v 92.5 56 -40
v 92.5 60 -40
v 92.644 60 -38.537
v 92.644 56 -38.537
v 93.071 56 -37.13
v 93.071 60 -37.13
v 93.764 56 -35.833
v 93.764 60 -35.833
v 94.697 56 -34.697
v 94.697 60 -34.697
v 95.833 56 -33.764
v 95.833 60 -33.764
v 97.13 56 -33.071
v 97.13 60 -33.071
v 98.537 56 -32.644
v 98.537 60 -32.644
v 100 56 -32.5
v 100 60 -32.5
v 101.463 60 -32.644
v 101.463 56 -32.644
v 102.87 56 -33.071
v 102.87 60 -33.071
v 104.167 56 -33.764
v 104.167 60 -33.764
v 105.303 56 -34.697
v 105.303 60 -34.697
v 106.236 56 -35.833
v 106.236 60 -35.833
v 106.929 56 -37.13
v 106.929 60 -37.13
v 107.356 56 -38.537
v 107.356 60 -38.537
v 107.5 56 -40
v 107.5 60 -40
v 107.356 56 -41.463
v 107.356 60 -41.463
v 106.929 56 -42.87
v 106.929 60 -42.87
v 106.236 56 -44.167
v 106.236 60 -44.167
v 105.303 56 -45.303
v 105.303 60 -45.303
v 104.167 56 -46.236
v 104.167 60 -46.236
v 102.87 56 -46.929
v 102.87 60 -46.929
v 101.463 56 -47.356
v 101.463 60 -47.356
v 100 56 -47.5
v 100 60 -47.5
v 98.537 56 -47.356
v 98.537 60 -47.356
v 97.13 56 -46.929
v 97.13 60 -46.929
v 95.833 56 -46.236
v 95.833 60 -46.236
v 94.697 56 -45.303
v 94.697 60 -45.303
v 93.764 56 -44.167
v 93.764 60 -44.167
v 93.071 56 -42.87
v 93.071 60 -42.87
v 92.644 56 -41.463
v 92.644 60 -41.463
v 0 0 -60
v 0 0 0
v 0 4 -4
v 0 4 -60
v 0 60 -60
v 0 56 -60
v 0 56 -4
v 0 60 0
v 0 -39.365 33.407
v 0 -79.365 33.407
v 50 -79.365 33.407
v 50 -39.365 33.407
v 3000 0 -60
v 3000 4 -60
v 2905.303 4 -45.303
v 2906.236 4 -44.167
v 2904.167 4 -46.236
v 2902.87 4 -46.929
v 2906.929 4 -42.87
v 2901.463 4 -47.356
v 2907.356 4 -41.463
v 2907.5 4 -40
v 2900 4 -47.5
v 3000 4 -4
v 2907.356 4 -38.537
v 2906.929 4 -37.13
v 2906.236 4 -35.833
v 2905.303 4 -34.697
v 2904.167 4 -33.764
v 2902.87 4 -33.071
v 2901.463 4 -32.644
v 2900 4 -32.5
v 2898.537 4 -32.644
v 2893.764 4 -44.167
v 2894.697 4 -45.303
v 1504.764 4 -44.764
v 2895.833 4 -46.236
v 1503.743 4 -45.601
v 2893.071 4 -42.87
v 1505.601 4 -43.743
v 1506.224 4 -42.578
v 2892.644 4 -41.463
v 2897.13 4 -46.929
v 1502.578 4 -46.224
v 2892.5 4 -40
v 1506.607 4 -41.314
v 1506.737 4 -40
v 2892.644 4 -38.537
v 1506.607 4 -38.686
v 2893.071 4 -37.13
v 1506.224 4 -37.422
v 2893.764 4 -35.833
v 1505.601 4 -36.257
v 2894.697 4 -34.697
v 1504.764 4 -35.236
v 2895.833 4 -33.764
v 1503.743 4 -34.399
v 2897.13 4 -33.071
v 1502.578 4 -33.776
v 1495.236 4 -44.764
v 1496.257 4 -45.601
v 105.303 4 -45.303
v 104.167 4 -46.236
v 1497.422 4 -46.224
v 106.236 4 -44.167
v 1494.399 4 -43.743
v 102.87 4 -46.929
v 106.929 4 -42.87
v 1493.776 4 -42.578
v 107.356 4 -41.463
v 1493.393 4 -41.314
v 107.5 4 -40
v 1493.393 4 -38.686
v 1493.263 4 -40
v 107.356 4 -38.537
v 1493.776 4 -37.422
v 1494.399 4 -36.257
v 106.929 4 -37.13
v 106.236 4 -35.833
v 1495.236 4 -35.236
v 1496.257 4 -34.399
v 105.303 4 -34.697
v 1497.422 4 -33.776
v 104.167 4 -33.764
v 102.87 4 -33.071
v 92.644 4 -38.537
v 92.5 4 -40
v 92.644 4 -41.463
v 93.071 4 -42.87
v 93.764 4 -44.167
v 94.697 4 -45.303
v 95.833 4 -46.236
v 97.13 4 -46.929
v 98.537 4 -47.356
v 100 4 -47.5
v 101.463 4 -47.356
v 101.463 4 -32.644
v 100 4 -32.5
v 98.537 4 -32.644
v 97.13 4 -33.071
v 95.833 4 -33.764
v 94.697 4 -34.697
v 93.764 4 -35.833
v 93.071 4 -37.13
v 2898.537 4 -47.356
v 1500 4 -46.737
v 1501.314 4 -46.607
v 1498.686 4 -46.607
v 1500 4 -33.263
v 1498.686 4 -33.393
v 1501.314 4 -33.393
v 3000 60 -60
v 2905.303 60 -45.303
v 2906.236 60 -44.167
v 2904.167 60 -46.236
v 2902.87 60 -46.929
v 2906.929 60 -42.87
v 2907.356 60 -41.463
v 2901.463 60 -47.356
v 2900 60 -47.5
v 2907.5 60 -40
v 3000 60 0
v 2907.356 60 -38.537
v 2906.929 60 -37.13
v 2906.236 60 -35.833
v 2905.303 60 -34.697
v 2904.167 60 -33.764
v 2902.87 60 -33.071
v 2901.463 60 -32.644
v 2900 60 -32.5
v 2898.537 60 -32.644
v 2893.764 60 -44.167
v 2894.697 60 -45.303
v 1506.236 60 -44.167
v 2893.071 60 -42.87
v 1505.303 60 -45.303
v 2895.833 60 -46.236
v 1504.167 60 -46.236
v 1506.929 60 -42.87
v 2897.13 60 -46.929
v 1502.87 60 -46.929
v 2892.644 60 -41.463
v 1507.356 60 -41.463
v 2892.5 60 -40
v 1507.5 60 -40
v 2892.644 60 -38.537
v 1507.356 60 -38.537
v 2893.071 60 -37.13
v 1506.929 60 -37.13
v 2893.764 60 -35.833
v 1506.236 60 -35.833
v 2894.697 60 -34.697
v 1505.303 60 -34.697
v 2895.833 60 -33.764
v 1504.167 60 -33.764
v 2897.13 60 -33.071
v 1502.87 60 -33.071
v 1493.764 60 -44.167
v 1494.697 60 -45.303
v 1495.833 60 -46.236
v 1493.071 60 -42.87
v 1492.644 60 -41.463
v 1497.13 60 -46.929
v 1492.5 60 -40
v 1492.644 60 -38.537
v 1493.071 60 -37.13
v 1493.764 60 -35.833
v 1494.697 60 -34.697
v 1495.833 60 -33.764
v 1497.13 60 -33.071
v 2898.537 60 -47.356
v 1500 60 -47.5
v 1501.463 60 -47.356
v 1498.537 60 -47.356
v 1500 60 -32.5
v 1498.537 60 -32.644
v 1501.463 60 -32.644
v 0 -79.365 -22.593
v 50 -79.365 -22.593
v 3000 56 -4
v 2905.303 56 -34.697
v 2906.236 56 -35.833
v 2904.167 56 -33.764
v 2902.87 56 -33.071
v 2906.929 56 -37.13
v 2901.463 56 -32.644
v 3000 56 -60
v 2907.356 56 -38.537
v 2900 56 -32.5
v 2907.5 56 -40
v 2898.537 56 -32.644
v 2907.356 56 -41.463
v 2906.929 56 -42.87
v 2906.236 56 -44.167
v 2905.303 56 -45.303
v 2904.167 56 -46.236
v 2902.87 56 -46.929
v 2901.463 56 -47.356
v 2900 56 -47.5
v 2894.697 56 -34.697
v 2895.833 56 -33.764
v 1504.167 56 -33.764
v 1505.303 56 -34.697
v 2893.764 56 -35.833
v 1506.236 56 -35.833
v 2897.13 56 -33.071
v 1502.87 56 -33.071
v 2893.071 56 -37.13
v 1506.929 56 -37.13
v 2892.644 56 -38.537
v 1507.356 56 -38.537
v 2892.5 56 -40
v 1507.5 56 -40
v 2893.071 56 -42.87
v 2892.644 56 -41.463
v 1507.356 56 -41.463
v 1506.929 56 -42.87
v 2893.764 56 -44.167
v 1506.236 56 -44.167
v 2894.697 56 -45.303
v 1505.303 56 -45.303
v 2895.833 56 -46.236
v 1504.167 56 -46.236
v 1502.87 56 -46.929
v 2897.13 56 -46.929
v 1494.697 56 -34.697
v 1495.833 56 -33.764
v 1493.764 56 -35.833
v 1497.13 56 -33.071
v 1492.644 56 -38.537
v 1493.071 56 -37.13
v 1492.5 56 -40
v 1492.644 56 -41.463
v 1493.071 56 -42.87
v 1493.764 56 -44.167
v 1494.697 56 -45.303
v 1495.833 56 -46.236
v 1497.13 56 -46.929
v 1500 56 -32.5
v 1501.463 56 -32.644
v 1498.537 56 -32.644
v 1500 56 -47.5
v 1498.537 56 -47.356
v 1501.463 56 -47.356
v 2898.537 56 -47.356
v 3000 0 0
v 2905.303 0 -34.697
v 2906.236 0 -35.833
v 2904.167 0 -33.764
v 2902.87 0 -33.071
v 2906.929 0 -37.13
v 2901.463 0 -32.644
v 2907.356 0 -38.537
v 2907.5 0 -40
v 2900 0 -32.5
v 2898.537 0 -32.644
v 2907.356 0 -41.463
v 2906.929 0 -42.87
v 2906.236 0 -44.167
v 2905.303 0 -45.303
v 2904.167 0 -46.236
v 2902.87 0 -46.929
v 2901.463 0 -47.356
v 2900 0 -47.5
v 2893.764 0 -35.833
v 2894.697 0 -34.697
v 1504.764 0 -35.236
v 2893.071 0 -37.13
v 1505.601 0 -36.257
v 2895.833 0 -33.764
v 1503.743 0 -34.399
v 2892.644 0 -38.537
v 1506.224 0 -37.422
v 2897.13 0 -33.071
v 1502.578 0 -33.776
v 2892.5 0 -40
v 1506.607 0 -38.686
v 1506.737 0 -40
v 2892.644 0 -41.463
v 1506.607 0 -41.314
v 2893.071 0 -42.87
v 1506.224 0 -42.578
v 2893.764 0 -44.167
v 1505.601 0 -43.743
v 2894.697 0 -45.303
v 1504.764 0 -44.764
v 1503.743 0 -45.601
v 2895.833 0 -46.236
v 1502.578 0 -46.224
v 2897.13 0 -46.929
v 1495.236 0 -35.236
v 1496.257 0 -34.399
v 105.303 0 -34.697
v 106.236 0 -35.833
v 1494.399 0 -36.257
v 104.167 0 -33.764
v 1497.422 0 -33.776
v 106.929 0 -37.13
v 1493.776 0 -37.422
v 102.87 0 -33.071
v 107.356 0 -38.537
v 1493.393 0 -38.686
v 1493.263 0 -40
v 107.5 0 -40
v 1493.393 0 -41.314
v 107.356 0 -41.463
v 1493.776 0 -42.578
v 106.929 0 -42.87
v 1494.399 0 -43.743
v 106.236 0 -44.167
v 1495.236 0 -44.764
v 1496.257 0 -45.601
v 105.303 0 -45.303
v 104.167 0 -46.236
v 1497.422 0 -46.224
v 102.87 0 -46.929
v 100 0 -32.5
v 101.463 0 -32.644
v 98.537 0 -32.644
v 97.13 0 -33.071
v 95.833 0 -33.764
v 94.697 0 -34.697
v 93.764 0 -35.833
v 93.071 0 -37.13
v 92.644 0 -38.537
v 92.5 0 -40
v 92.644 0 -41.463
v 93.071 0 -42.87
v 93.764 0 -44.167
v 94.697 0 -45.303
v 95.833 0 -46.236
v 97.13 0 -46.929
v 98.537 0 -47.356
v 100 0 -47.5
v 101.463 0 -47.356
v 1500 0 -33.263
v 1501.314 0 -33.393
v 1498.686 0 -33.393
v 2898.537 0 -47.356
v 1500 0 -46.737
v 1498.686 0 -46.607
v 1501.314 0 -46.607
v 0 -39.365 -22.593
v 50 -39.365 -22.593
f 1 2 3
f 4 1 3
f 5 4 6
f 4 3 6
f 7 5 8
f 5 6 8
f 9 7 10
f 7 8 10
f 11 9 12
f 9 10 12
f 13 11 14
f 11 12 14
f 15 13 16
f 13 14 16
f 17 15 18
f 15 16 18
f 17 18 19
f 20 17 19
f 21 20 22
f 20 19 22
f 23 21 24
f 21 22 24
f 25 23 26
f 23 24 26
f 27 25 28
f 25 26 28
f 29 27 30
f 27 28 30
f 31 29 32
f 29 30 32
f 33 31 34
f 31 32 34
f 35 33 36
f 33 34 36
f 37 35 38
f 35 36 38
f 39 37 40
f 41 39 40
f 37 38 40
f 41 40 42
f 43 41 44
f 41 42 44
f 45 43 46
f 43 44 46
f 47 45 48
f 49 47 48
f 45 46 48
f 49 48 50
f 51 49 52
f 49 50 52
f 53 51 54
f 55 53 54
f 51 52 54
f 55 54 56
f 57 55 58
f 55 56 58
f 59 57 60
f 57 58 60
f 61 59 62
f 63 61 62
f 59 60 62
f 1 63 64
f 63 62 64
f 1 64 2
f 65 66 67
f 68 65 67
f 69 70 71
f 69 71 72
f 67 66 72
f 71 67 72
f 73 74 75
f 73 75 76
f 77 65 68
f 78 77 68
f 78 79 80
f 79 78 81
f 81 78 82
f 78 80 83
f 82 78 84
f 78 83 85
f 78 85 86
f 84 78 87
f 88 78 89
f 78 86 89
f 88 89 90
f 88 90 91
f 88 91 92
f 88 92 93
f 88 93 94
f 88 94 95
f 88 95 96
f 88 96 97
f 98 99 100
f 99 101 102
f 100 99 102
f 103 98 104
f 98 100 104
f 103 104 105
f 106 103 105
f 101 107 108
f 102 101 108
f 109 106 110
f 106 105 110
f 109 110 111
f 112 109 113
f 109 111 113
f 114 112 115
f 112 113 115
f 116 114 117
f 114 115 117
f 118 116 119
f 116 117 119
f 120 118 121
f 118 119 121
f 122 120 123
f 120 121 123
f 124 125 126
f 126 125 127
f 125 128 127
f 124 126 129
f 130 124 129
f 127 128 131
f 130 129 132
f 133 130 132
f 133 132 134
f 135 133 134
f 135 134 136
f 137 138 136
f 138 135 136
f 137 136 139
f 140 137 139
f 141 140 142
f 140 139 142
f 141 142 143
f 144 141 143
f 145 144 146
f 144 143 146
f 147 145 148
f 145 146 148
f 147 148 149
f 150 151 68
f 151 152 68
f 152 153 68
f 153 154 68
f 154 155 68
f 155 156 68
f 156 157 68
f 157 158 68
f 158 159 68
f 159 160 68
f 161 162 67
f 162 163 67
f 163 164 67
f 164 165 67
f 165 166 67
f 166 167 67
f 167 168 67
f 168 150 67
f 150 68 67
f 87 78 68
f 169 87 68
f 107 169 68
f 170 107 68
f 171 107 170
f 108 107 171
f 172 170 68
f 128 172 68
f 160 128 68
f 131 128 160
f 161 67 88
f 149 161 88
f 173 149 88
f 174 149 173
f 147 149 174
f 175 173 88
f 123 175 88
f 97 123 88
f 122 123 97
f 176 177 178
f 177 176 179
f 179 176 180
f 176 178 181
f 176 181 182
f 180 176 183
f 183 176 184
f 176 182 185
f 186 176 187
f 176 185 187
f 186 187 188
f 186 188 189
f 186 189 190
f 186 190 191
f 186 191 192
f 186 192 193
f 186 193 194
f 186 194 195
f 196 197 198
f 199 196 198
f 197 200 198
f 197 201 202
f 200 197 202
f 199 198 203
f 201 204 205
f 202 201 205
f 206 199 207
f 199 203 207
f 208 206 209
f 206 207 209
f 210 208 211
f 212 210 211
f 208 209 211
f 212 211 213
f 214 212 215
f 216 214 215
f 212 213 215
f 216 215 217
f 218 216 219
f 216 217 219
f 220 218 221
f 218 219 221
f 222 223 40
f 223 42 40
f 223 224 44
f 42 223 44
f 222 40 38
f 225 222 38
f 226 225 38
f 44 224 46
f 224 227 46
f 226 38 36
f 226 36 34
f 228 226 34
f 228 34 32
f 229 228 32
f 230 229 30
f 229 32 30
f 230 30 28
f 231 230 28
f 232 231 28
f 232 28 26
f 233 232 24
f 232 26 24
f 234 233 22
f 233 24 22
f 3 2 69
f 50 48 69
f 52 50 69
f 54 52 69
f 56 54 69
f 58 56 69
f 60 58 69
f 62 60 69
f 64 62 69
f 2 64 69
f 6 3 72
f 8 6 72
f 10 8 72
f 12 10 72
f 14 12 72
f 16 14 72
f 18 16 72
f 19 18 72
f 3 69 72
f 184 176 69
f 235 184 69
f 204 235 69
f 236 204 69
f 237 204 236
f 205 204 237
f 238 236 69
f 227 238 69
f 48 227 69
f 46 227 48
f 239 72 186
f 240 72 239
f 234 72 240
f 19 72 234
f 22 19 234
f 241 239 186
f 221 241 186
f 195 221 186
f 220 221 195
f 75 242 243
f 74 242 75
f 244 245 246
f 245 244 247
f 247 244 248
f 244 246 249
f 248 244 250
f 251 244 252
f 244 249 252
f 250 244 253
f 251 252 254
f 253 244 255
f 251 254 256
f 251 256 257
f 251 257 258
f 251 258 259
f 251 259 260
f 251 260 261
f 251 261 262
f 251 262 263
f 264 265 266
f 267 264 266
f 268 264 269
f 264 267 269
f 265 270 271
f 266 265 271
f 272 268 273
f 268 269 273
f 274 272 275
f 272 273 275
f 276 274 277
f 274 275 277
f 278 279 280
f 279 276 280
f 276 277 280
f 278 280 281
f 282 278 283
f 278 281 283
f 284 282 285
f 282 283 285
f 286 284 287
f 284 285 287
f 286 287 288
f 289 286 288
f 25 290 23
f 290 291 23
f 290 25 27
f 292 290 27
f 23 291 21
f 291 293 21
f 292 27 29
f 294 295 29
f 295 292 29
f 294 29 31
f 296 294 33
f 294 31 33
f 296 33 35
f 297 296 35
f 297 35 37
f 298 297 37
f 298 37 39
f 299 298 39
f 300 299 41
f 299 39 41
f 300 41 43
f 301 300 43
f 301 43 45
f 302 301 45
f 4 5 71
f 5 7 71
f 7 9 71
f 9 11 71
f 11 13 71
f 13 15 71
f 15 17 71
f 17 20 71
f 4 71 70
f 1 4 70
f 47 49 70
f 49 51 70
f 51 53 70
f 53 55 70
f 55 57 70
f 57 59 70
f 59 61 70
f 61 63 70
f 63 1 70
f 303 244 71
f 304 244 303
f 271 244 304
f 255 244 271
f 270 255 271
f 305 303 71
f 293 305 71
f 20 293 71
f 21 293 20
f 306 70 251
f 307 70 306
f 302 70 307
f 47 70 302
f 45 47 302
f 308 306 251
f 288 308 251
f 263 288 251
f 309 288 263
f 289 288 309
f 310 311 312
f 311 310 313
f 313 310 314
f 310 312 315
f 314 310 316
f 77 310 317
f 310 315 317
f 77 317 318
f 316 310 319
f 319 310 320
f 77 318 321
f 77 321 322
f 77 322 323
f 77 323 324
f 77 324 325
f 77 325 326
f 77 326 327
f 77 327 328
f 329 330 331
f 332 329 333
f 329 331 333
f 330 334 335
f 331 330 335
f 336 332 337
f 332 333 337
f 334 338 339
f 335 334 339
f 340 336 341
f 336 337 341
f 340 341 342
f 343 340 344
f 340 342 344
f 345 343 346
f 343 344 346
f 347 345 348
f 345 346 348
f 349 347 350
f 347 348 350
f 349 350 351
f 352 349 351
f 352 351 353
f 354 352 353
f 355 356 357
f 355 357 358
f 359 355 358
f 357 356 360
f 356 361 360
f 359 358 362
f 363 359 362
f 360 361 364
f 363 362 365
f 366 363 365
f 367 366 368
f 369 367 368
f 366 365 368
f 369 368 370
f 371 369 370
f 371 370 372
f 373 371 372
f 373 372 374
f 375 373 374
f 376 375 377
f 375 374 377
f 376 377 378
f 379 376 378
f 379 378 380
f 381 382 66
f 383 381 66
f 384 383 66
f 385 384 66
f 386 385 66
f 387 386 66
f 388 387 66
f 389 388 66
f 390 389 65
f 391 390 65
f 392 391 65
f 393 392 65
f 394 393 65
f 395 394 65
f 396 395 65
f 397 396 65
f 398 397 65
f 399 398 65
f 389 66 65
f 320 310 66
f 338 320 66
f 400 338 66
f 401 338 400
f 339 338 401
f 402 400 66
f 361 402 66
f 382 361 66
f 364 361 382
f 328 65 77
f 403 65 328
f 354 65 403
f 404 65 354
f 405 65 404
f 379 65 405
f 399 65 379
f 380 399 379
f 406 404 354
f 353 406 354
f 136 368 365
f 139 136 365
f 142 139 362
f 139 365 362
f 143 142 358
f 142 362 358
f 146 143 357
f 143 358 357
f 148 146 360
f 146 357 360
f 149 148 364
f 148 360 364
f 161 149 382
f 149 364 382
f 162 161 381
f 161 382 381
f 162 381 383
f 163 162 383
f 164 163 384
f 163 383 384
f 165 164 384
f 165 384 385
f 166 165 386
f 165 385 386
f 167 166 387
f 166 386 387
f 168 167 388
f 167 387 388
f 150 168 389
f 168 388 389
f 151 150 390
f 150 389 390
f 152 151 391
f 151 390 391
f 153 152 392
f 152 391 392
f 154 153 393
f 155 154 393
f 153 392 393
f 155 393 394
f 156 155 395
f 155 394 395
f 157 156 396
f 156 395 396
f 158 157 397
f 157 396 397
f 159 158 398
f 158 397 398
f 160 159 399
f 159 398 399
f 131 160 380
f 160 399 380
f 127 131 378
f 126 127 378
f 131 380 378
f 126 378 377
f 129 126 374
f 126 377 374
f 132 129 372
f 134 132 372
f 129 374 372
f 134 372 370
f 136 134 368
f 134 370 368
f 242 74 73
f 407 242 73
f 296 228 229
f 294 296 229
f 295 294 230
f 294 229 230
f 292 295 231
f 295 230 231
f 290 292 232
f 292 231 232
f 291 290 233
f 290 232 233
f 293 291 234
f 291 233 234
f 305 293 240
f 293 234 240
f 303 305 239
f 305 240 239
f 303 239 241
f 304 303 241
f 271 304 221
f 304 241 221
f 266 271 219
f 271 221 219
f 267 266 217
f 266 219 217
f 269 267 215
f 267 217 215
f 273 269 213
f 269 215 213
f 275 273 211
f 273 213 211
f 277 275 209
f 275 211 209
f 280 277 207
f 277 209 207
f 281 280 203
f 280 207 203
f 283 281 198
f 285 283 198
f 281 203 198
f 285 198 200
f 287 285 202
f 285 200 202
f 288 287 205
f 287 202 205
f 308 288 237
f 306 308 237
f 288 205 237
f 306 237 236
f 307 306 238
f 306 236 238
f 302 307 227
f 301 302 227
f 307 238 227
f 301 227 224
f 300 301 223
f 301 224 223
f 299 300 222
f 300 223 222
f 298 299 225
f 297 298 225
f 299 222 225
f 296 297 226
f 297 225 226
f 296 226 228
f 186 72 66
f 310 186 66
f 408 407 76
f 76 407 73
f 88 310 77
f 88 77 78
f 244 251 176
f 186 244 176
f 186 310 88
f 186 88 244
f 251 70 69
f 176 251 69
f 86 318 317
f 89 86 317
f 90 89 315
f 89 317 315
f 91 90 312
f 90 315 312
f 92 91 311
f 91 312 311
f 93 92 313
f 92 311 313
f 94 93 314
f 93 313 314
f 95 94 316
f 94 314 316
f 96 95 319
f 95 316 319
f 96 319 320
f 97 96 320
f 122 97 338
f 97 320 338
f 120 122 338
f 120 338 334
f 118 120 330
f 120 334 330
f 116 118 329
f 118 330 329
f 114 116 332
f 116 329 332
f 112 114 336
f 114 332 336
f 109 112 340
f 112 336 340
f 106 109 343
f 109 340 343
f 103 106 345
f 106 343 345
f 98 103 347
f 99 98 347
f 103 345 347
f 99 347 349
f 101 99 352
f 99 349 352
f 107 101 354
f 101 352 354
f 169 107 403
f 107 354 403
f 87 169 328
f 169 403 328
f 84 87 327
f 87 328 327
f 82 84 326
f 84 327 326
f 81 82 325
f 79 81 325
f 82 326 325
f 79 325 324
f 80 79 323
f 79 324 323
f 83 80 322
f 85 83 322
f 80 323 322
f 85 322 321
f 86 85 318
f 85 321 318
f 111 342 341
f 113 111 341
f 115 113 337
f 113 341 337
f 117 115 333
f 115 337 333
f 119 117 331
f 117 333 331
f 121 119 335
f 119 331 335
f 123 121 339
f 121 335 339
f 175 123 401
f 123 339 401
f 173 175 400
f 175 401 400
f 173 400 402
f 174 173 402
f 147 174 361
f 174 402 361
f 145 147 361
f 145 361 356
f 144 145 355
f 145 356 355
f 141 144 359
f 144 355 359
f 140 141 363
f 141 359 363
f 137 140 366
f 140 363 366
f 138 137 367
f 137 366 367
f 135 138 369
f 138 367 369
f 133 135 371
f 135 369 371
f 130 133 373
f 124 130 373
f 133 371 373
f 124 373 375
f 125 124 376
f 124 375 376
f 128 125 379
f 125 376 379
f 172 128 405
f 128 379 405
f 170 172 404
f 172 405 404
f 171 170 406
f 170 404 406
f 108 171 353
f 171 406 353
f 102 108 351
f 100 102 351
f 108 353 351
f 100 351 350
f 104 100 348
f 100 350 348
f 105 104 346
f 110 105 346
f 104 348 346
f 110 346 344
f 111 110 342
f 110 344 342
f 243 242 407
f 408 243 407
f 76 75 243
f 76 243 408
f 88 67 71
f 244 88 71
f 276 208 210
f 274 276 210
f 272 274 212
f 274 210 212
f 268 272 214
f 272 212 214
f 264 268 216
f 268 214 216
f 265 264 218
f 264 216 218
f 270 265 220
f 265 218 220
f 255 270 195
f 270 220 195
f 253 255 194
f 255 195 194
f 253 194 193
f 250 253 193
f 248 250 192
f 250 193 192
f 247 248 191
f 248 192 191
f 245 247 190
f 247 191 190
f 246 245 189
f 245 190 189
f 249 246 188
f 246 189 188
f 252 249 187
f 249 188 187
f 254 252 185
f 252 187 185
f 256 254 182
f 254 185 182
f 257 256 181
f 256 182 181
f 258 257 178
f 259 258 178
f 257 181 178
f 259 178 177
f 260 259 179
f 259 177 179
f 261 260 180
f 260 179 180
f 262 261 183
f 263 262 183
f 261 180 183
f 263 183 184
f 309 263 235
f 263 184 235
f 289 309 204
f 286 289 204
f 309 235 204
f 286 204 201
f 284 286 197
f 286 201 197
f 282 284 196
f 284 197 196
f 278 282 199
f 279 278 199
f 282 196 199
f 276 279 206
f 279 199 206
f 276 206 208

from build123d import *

# Parameters (mm, degrees)
F1_DEPTH  = 3000
F2_R      = 7.5
F3_DEPTH  = 4
F4_R      = 7.5
F5_DEPTH  = 4
F6_R      = 7.5
F7_DEPTH  = 4
F8_R      = 7.5
F9_DEPTH  = 4
F10_R     = 6.736865
F11_DEPTH = 4
F12_R     = 7.5
F13_DEPTH = 4
F14_W     = 40
F14_H     = 56
F15_DEPTH = 50


with BuildPart() as f1:
    # F0 (on Right) → F1 (new body)
    with BuildSketch(Plane.YZ):
        Polygon((60, 0), (0, 0), (0, -60), (4, -60), (4, -4), (56, -4), (56, -60), (60, -60), align=None)
    extrude(amount=F1_DEPTH)

    # F2 (on face) → F3 (cut)
    with BuildSketch(Plane(origin=(0, 60, 0), x_dir=(-1, 0, 0), z_dir=(0, 1, 0))):
        with Locations((-100, -40)):
            Circle(F2_R)
    extrude(amount=-F3_DEPTH, mode=Mode.SUBTRACT)

    # F4 (on face) → F5 (cut)
    with BuildSketch(Plane(origin=(0, 60, 0), x_dir=(-1, 0, 0), z_dir=(0, 1, 0))):
        with Locations((-2900, -40)):
            Circle(F4_R)
    extrude(amount=-F5_DEPTH, mode=Mode.SUBTRACT)

    # F6 (on face) → F7 (cut)
    with BuildSketch(Plane(origin=(0, 60, 0), x_dir=(-1, 0, 0), z_dir=(0, 1, 0))):
        with Locations((-1500, -40)):
            Circle(F6_R)
    extrude(amount=-F7_DEPTH, mode=Mode.SUBTRACT)

    # F8 (on face) → F9 (cut)
    with BuildSketch(Plane.XZ):
        with Locations((100, -40)):
            Circle(F8_R)
    extrude(amount=-F9_DEPTH, mode=Mode.SUBTRACT)

    # F10 (on face) → F11 (cut)
    with BuildSketch(Plane.XZ):
        with Locations((1500, -40)):
            Circle(F10_R)
    extrude(amount=-F11_DEPTH, mode=Mode.SUBTRACT)

    # F12 (on face) → F13 (cut)
    with BuildSketch(Plane.XZ):
        with Locations((2900, -40)):
            Circle(F12_R)
    extrude(amount=-F13_DEPTH, mode=Mode.SUBTRACT)


with BuildPart() as f15:
    # F14 (on Right) → F15 (new body)
    with BuildSketch(Plane.YZ):
        with Locations((-59.364777, 5.406995)):
            Rectangle(F14_W, F14_H)
    extrude(amount=F15_DEPTH)


solid = Compound([f1.part, f15.part])
